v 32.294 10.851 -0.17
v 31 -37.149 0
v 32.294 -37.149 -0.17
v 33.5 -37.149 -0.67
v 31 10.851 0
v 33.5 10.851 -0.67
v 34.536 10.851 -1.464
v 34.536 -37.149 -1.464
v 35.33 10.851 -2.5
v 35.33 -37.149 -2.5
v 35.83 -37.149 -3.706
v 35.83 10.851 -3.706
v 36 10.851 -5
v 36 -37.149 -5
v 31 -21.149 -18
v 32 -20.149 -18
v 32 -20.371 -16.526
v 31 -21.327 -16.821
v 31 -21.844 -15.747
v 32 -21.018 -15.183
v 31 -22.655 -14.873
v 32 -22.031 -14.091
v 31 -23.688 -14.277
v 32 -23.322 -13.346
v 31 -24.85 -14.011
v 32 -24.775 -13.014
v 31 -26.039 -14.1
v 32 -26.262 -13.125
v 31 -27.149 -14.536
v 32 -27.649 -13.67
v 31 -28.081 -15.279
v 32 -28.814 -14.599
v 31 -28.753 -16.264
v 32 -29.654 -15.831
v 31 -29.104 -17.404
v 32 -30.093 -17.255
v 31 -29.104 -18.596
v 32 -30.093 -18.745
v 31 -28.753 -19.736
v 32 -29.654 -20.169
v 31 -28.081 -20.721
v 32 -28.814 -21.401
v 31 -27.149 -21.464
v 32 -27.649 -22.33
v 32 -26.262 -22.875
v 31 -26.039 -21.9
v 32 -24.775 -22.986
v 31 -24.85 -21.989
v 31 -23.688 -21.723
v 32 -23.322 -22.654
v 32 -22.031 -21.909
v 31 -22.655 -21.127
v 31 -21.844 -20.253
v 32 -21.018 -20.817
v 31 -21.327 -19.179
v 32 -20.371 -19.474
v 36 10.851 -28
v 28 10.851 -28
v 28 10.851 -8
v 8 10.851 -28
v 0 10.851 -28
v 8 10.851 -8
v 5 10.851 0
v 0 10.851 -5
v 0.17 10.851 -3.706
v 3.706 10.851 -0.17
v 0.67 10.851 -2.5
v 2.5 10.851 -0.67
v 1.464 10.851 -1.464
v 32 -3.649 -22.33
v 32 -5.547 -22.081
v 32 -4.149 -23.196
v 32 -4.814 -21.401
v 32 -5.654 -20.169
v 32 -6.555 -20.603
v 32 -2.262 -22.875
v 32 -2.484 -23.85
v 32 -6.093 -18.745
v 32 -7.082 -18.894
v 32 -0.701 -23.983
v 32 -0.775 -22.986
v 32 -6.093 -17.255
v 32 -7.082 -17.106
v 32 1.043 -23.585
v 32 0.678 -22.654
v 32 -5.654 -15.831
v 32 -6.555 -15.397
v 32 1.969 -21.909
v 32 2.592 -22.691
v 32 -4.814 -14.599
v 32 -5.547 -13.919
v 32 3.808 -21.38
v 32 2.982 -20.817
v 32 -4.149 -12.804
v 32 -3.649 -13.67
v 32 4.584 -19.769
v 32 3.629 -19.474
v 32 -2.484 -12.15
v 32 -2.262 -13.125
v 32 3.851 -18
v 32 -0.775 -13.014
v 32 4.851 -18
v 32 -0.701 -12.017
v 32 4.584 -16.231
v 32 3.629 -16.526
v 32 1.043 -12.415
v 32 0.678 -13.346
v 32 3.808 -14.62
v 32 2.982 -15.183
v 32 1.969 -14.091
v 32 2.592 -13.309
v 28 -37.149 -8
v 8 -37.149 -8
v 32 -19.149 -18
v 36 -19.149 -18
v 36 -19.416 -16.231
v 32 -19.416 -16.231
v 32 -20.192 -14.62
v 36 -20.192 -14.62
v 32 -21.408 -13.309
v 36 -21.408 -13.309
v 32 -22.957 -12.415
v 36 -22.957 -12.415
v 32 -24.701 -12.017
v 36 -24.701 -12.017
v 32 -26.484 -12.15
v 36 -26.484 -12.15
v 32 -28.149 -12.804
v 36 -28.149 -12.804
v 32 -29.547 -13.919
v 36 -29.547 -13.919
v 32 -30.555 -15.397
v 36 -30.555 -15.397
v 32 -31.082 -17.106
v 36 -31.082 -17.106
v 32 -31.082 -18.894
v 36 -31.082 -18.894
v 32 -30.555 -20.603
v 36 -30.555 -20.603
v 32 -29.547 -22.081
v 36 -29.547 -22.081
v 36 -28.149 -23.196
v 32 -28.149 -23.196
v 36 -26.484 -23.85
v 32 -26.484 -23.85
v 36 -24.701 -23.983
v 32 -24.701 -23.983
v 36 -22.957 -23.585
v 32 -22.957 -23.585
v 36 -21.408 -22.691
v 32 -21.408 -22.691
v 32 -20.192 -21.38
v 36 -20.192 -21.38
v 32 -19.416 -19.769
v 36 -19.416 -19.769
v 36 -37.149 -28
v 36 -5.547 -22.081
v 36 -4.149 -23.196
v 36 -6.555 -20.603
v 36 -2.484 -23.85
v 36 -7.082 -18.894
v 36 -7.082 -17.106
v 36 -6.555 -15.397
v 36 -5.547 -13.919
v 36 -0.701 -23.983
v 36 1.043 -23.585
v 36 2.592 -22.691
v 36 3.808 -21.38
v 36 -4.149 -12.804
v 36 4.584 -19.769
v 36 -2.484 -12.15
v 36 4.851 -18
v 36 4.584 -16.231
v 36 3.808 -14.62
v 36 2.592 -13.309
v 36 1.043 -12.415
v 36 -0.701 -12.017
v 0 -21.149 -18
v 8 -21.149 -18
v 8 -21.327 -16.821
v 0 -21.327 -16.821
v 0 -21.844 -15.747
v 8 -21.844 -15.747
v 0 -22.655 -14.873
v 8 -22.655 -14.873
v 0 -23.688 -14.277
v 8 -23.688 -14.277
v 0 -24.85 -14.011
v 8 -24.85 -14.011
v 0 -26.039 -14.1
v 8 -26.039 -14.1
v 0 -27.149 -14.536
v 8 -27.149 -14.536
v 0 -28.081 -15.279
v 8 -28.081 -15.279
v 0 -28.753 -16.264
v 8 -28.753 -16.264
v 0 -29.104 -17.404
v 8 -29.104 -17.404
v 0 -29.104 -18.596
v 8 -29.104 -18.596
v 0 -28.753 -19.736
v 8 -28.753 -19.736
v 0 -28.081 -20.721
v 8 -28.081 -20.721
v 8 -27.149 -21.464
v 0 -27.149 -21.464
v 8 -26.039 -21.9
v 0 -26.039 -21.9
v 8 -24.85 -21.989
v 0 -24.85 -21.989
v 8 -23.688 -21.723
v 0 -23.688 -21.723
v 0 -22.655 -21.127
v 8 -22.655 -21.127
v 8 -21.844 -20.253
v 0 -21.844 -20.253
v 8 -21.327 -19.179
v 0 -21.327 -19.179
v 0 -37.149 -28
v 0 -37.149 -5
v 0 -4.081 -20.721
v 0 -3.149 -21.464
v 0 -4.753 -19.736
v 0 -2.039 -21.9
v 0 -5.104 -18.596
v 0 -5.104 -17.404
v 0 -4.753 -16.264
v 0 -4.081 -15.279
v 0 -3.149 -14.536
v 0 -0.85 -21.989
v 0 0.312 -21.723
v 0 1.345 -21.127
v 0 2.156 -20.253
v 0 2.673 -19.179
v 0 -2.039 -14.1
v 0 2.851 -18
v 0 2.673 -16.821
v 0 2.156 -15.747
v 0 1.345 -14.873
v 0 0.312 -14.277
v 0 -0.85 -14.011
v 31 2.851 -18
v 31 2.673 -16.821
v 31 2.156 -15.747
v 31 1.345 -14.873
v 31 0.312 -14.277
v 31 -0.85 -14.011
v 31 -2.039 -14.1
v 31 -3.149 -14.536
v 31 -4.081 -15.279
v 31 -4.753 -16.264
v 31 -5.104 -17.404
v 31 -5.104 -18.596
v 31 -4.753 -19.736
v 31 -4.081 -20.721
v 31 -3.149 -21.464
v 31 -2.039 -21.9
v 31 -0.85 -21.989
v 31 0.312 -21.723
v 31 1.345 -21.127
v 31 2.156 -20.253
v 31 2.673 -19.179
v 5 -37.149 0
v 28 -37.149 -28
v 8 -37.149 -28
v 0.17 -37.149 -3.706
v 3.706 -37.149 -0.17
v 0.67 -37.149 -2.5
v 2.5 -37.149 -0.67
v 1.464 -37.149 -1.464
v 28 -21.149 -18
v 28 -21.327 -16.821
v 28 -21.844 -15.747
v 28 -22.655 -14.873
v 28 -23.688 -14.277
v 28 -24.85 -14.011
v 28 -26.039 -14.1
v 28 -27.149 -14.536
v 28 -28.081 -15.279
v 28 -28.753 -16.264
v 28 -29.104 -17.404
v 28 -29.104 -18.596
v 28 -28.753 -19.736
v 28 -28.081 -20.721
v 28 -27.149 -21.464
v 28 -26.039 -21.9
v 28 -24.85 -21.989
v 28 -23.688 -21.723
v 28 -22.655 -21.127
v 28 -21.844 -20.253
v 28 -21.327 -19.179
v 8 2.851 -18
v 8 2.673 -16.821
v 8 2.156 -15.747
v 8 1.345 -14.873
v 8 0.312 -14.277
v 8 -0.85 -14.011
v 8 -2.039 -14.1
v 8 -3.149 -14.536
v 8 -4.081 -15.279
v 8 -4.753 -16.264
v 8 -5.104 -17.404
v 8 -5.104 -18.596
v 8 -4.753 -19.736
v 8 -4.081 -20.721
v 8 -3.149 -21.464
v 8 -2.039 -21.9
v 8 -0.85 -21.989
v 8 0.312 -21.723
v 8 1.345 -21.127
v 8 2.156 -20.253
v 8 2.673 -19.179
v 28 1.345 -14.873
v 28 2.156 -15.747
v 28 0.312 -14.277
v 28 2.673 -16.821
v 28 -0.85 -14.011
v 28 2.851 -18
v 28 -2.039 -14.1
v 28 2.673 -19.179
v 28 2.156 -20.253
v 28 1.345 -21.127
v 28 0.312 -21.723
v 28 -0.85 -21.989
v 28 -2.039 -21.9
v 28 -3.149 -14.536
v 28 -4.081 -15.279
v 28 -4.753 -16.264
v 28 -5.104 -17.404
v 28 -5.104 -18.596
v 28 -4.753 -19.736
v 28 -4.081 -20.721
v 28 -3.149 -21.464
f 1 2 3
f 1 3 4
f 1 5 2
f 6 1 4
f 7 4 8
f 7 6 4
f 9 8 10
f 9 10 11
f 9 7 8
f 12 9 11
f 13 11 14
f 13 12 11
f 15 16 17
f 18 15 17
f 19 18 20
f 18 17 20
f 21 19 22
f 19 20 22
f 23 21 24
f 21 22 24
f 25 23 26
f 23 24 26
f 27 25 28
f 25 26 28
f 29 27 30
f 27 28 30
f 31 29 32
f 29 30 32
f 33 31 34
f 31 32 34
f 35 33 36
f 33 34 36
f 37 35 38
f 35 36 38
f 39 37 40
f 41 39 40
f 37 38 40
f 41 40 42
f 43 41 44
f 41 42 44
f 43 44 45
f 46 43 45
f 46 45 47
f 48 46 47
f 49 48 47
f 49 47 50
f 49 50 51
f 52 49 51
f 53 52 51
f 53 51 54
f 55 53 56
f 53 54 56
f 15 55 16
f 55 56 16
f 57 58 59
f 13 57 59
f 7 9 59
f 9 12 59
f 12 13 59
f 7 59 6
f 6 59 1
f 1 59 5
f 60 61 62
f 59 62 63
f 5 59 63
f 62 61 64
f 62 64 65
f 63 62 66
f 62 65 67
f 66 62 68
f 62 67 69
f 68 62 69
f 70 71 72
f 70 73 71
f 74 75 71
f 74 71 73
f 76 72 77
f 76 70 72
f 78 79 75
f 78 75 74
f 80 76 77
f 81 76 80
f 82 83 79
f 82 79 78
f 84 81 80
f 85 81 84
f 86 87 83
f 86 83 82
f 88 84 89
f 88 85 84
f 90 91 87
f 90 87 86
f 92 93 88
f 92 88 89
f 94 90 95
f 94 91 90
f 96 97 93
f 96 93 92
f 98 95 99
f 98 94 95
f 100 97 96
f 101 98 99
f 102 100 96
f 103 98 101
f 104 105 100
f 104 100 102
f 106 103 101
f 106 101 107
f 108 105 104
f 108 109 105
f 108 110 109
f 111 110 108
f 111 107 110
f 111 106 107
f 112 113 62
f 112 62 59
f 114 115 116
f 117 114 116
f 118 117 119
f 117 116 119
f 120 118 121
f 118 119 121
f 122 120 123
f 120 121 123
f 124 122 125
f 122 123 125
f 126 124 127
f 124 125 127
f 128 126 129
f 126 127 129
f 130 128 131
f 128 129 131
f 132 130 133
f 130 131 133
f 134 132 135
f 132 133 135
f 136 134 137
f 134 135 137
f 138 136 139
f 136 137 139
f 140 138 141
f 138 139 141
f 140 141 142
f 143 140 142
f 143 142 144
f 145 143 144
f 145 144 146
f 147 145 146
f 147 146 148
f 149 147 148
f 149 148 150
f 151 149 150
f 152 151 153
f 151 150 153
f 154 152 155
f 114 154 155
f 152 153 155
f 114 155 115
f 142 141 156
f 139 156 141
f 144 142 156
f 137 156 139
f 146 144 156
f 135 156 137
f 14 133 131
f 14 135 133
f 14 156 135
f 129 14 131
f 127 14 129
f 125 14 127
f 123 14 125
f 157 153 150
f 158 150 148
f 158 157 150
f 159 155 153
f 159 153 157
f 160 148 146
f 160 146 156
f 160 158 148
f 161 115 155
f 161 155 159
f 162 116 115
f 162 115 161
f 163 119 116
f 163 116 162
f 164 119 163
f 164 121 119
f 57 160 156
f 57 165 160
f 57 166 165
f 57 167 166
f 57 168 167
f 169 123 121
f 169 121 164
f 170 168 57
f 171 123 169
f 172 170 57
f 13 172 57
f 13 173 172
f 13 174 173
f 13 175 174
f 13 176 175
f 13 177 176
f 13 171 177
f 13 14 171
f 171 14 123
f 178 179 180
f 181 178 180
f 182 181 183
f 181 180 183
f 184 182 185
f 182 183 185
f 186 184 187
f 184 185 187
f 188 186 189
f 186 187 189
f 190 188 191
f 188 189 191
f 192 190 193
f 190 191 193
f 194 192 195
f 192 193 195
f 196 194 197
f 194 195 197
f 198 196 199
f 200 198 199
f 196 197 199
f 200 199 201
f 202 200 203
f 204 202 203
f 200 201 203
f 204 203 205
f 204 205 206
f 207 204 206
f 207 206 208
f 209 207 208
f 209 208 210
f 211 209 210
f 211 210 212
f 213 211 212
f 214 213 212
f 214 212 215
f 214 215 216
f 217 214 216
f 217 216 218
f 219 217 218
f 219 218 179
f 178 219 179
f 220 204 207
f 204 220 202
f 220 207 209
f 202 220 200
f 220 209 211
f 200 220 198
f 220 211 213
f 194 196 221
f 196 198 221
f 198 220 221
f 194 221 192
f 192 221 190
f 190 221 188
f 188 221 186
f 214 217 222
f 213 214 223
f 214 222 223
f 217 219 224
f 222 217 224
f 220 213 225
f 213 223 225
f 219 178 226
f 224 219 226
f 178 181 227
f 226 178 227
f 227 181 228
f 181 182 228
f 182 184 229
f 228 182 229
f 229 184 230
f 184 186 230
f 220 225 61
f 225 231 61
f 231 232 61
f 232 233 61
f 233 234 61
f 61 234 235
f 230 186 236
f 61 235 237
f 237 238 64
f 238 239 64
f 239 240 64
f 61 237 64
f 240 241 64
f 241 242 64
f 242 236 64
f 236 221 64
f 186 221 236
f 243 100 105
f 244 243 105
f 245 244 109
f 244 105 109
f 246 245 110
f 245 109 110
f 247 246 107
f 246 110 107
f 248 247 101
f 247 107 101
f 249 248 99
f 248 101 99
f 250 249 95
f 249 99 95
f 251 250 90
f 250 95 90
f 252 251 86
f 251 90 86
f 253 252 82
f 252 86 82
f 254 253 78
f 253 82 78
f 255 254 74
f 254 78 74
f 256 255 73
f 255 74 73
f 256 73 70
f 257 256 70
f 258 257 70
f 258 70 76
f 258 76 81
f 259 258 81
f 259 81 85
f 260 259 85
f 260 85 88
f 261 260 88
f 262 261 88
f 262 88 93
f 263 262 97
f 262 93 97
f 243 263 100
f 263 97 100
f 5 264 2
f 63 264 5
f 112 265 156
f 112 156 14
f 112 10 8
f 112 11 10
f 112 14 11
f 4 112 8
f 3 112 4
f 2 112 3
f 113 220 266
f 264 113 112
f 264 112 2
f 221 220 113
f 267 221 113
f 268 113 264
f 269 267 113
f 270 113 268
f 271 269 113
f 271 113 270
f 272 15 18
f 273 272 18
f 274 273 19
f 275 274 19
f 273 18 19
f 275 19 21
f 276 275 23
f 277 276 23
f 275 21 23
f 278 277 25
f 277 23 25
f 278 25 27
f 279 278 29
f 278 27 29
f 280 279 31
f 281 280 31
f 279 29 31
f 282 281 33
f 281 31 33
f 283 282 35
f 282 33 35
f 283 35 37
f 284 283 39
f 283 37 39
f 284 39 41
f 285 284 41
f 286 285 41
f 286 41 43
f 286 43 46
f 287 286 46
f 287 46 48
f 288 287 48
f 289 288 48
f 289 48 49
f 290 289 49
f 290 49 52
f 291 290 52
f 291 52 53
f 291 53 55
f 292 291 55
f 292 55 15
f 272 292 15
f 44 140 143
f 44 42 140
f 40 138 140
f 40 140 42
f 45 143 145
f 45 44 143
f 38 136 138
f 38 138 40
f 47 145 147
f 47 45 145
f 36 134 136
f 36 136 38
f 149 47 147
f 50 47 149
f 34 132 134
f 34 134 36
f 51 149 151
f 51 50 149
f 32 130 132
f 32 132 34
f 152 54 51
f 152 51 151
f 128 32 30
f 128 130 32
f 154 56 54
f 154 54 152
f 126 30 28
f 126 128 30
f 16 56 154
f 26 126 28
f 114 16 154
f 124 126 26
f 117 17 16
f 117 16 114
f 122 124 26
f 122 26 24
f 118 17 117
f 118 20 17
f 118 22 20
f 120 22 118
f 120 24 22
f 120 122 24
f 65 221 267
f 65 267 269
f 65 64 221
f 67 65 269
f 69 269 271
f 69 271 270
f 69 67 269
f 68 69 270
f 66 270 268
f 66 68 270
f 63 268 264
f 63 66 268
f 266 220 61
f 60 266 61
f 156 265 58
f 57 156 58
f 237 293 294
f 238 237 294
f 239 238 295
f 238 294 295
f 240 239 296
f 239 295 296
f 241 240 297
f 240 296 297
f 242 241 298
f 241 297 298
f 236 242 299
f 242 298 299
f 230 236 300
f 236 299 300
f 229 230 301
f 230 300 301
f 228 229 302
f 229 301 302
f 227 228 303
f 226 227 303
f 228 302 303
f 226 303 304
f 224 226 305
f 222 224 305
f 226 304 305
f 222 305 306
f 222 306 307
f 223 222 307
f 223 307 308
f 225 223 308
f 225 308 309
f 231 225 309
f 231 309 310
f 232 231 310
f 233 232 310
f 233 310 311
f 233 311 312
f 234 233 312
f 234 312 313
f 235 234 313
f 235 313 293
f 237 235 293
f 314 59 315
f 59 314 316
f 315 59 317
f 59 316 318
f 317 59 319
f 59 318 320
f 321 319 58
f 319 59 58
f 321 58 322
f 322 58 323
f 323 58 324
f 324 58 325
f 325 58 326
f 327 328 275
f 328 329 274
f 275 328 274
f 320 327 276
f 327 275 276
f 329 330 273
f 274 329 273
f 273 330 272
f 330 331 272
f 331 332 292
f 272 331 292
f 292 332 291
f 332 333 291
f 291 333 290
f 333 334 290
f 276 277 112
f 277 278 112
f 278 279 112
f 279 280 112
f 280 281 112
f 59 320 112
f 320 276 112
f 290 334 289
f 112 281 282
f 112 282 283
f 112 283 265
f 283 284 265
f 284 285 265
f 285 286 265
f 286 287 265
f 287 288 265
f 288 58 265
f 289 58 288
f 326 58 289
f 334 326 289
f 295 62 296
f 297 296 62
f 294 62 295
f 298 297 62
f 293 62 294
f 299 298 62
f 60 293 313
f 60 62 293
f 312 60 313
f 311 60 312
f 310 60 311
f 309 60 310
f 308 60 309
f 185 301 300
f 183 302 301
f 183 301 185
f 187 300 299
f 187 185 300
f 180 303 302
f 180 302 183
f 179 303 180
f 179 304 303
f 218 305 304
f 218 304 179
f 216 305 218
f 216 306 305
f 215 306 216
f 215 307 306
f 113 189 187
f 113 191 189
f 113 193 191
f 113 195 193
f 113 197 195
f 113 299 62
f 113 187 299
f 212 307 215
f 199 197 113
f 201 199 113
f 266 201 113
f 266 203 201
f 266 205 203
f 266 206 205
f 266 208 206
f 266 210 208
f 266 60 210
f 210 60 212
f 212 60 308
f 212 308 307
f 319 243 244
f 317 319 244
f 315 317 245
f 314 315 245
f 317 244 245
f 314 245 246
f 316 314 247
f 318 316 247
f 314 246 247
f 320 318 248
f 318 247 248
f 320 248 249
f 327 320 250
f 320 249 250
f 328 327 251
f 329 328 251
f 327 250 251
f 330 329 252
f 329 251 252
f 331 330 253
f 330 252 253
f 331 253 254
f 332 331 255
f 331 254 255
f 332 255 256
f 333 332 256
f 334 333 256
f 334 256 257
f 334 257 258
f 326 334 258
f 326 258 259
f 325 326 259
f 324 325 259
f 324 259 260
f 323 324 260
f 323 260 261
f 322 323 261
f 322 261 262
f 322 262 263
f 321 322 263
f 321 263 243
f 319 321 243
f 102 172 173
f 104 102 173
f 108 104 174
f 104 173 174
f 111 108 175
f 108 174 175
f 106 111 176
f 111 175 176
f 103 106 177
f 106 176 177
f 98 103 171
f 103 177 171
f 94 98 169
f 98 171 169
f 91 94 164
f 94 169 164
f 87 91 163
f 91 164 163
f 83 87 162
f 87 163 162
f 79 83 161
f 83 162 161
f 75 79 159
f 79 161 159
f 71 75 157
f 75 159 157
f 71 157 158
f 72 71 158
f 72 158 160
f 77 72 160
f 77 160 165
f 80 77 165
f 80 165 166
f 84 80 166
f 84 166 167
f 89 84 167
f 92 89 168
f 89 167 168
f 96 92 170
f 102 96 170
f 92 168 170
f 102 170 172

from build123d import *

# Parameters (mm, degrees)
F0_W     = 48
F0_H     = 28
F1_DEPTH = 36
F2_W     = 20
F2_H     = 48
F3_DEPTH = 20
F4_R     = 5
F5_R     = 4
F6_DEPTH = 36
F7_R     = 6
F8_DEPTH = 4
F9_SIZE  = 1


with BuildPart() as f1:
    # F0 (on Right) → F1 (new body)
    with BuildSketch(Plane.YZ):
        with Locations((-13.1489487588, -14)):
            Rectangle(F0_W, F0_H)
    extrude(amount=F1_DEPTH)

    # F2 (on face) → F3 (cut)
    with BuildSketch(Plane(origin=(0, 0, -28), x_dir=(1, 0, 0), z_dir=(0, 0, -1))):
        with Locations((18, 13.1489487588)):
            Rectangle(F2_W, F2_H)
    extrude(amount=-F3_DEPTH, mode=Mode.SUBTRACT)

    # F4
    f4_edges = [f1.edges().sort_by_distance(p)[0] for p in [
        (0, -13.148949, 0),
        (36, -13.148949, 0),
    ]]
    fillet(f4_edges, radius=F4_R)

    # F5 (on face) → F6 (cut)
    with BuildSketch(Plane.YZ.offset(36)):
        with Locations((46.8510512412, -18)):
            Circle(F5_R)
        with Locations((22.8510512412, -18)):
            Circle(F5_R)
        with Locations((-1.1489487588, -18)):
            Circle(F5_R)
        with Locations((-25.1489487588, -18)):
            Circle(F5_R)
    extrude(amount=-F6_DEPTH, mode=Mode.SUBTRACT)

    # F7 (on face) → F8 (cut)
    with BuildSketch(Plane.YZ.offset(36)):
        with Locations((-25.1489487588, -18)):
            Circle(F7_R)
        with Locations((-1.1489487588, -18)):
            Circle(F7_R)
        with Locations((22.8510512412, -18)):
            Circle(F7_R)
        with Locations((46.8510512412, -18)):
            Circle(F7_R)
    extrude(amount=-F8_DEPTH, mode=Mode.SUBTRACT)

    # F9
    f9_edges = [f1.edges().sort_by_distance(p)[0] for p in [
        (32, -29.148949, -18),
        (32, -5.148949, -18),
    ]]
    chamfer(f9_edges, length=F9_SIZE)


solid = f1.part
